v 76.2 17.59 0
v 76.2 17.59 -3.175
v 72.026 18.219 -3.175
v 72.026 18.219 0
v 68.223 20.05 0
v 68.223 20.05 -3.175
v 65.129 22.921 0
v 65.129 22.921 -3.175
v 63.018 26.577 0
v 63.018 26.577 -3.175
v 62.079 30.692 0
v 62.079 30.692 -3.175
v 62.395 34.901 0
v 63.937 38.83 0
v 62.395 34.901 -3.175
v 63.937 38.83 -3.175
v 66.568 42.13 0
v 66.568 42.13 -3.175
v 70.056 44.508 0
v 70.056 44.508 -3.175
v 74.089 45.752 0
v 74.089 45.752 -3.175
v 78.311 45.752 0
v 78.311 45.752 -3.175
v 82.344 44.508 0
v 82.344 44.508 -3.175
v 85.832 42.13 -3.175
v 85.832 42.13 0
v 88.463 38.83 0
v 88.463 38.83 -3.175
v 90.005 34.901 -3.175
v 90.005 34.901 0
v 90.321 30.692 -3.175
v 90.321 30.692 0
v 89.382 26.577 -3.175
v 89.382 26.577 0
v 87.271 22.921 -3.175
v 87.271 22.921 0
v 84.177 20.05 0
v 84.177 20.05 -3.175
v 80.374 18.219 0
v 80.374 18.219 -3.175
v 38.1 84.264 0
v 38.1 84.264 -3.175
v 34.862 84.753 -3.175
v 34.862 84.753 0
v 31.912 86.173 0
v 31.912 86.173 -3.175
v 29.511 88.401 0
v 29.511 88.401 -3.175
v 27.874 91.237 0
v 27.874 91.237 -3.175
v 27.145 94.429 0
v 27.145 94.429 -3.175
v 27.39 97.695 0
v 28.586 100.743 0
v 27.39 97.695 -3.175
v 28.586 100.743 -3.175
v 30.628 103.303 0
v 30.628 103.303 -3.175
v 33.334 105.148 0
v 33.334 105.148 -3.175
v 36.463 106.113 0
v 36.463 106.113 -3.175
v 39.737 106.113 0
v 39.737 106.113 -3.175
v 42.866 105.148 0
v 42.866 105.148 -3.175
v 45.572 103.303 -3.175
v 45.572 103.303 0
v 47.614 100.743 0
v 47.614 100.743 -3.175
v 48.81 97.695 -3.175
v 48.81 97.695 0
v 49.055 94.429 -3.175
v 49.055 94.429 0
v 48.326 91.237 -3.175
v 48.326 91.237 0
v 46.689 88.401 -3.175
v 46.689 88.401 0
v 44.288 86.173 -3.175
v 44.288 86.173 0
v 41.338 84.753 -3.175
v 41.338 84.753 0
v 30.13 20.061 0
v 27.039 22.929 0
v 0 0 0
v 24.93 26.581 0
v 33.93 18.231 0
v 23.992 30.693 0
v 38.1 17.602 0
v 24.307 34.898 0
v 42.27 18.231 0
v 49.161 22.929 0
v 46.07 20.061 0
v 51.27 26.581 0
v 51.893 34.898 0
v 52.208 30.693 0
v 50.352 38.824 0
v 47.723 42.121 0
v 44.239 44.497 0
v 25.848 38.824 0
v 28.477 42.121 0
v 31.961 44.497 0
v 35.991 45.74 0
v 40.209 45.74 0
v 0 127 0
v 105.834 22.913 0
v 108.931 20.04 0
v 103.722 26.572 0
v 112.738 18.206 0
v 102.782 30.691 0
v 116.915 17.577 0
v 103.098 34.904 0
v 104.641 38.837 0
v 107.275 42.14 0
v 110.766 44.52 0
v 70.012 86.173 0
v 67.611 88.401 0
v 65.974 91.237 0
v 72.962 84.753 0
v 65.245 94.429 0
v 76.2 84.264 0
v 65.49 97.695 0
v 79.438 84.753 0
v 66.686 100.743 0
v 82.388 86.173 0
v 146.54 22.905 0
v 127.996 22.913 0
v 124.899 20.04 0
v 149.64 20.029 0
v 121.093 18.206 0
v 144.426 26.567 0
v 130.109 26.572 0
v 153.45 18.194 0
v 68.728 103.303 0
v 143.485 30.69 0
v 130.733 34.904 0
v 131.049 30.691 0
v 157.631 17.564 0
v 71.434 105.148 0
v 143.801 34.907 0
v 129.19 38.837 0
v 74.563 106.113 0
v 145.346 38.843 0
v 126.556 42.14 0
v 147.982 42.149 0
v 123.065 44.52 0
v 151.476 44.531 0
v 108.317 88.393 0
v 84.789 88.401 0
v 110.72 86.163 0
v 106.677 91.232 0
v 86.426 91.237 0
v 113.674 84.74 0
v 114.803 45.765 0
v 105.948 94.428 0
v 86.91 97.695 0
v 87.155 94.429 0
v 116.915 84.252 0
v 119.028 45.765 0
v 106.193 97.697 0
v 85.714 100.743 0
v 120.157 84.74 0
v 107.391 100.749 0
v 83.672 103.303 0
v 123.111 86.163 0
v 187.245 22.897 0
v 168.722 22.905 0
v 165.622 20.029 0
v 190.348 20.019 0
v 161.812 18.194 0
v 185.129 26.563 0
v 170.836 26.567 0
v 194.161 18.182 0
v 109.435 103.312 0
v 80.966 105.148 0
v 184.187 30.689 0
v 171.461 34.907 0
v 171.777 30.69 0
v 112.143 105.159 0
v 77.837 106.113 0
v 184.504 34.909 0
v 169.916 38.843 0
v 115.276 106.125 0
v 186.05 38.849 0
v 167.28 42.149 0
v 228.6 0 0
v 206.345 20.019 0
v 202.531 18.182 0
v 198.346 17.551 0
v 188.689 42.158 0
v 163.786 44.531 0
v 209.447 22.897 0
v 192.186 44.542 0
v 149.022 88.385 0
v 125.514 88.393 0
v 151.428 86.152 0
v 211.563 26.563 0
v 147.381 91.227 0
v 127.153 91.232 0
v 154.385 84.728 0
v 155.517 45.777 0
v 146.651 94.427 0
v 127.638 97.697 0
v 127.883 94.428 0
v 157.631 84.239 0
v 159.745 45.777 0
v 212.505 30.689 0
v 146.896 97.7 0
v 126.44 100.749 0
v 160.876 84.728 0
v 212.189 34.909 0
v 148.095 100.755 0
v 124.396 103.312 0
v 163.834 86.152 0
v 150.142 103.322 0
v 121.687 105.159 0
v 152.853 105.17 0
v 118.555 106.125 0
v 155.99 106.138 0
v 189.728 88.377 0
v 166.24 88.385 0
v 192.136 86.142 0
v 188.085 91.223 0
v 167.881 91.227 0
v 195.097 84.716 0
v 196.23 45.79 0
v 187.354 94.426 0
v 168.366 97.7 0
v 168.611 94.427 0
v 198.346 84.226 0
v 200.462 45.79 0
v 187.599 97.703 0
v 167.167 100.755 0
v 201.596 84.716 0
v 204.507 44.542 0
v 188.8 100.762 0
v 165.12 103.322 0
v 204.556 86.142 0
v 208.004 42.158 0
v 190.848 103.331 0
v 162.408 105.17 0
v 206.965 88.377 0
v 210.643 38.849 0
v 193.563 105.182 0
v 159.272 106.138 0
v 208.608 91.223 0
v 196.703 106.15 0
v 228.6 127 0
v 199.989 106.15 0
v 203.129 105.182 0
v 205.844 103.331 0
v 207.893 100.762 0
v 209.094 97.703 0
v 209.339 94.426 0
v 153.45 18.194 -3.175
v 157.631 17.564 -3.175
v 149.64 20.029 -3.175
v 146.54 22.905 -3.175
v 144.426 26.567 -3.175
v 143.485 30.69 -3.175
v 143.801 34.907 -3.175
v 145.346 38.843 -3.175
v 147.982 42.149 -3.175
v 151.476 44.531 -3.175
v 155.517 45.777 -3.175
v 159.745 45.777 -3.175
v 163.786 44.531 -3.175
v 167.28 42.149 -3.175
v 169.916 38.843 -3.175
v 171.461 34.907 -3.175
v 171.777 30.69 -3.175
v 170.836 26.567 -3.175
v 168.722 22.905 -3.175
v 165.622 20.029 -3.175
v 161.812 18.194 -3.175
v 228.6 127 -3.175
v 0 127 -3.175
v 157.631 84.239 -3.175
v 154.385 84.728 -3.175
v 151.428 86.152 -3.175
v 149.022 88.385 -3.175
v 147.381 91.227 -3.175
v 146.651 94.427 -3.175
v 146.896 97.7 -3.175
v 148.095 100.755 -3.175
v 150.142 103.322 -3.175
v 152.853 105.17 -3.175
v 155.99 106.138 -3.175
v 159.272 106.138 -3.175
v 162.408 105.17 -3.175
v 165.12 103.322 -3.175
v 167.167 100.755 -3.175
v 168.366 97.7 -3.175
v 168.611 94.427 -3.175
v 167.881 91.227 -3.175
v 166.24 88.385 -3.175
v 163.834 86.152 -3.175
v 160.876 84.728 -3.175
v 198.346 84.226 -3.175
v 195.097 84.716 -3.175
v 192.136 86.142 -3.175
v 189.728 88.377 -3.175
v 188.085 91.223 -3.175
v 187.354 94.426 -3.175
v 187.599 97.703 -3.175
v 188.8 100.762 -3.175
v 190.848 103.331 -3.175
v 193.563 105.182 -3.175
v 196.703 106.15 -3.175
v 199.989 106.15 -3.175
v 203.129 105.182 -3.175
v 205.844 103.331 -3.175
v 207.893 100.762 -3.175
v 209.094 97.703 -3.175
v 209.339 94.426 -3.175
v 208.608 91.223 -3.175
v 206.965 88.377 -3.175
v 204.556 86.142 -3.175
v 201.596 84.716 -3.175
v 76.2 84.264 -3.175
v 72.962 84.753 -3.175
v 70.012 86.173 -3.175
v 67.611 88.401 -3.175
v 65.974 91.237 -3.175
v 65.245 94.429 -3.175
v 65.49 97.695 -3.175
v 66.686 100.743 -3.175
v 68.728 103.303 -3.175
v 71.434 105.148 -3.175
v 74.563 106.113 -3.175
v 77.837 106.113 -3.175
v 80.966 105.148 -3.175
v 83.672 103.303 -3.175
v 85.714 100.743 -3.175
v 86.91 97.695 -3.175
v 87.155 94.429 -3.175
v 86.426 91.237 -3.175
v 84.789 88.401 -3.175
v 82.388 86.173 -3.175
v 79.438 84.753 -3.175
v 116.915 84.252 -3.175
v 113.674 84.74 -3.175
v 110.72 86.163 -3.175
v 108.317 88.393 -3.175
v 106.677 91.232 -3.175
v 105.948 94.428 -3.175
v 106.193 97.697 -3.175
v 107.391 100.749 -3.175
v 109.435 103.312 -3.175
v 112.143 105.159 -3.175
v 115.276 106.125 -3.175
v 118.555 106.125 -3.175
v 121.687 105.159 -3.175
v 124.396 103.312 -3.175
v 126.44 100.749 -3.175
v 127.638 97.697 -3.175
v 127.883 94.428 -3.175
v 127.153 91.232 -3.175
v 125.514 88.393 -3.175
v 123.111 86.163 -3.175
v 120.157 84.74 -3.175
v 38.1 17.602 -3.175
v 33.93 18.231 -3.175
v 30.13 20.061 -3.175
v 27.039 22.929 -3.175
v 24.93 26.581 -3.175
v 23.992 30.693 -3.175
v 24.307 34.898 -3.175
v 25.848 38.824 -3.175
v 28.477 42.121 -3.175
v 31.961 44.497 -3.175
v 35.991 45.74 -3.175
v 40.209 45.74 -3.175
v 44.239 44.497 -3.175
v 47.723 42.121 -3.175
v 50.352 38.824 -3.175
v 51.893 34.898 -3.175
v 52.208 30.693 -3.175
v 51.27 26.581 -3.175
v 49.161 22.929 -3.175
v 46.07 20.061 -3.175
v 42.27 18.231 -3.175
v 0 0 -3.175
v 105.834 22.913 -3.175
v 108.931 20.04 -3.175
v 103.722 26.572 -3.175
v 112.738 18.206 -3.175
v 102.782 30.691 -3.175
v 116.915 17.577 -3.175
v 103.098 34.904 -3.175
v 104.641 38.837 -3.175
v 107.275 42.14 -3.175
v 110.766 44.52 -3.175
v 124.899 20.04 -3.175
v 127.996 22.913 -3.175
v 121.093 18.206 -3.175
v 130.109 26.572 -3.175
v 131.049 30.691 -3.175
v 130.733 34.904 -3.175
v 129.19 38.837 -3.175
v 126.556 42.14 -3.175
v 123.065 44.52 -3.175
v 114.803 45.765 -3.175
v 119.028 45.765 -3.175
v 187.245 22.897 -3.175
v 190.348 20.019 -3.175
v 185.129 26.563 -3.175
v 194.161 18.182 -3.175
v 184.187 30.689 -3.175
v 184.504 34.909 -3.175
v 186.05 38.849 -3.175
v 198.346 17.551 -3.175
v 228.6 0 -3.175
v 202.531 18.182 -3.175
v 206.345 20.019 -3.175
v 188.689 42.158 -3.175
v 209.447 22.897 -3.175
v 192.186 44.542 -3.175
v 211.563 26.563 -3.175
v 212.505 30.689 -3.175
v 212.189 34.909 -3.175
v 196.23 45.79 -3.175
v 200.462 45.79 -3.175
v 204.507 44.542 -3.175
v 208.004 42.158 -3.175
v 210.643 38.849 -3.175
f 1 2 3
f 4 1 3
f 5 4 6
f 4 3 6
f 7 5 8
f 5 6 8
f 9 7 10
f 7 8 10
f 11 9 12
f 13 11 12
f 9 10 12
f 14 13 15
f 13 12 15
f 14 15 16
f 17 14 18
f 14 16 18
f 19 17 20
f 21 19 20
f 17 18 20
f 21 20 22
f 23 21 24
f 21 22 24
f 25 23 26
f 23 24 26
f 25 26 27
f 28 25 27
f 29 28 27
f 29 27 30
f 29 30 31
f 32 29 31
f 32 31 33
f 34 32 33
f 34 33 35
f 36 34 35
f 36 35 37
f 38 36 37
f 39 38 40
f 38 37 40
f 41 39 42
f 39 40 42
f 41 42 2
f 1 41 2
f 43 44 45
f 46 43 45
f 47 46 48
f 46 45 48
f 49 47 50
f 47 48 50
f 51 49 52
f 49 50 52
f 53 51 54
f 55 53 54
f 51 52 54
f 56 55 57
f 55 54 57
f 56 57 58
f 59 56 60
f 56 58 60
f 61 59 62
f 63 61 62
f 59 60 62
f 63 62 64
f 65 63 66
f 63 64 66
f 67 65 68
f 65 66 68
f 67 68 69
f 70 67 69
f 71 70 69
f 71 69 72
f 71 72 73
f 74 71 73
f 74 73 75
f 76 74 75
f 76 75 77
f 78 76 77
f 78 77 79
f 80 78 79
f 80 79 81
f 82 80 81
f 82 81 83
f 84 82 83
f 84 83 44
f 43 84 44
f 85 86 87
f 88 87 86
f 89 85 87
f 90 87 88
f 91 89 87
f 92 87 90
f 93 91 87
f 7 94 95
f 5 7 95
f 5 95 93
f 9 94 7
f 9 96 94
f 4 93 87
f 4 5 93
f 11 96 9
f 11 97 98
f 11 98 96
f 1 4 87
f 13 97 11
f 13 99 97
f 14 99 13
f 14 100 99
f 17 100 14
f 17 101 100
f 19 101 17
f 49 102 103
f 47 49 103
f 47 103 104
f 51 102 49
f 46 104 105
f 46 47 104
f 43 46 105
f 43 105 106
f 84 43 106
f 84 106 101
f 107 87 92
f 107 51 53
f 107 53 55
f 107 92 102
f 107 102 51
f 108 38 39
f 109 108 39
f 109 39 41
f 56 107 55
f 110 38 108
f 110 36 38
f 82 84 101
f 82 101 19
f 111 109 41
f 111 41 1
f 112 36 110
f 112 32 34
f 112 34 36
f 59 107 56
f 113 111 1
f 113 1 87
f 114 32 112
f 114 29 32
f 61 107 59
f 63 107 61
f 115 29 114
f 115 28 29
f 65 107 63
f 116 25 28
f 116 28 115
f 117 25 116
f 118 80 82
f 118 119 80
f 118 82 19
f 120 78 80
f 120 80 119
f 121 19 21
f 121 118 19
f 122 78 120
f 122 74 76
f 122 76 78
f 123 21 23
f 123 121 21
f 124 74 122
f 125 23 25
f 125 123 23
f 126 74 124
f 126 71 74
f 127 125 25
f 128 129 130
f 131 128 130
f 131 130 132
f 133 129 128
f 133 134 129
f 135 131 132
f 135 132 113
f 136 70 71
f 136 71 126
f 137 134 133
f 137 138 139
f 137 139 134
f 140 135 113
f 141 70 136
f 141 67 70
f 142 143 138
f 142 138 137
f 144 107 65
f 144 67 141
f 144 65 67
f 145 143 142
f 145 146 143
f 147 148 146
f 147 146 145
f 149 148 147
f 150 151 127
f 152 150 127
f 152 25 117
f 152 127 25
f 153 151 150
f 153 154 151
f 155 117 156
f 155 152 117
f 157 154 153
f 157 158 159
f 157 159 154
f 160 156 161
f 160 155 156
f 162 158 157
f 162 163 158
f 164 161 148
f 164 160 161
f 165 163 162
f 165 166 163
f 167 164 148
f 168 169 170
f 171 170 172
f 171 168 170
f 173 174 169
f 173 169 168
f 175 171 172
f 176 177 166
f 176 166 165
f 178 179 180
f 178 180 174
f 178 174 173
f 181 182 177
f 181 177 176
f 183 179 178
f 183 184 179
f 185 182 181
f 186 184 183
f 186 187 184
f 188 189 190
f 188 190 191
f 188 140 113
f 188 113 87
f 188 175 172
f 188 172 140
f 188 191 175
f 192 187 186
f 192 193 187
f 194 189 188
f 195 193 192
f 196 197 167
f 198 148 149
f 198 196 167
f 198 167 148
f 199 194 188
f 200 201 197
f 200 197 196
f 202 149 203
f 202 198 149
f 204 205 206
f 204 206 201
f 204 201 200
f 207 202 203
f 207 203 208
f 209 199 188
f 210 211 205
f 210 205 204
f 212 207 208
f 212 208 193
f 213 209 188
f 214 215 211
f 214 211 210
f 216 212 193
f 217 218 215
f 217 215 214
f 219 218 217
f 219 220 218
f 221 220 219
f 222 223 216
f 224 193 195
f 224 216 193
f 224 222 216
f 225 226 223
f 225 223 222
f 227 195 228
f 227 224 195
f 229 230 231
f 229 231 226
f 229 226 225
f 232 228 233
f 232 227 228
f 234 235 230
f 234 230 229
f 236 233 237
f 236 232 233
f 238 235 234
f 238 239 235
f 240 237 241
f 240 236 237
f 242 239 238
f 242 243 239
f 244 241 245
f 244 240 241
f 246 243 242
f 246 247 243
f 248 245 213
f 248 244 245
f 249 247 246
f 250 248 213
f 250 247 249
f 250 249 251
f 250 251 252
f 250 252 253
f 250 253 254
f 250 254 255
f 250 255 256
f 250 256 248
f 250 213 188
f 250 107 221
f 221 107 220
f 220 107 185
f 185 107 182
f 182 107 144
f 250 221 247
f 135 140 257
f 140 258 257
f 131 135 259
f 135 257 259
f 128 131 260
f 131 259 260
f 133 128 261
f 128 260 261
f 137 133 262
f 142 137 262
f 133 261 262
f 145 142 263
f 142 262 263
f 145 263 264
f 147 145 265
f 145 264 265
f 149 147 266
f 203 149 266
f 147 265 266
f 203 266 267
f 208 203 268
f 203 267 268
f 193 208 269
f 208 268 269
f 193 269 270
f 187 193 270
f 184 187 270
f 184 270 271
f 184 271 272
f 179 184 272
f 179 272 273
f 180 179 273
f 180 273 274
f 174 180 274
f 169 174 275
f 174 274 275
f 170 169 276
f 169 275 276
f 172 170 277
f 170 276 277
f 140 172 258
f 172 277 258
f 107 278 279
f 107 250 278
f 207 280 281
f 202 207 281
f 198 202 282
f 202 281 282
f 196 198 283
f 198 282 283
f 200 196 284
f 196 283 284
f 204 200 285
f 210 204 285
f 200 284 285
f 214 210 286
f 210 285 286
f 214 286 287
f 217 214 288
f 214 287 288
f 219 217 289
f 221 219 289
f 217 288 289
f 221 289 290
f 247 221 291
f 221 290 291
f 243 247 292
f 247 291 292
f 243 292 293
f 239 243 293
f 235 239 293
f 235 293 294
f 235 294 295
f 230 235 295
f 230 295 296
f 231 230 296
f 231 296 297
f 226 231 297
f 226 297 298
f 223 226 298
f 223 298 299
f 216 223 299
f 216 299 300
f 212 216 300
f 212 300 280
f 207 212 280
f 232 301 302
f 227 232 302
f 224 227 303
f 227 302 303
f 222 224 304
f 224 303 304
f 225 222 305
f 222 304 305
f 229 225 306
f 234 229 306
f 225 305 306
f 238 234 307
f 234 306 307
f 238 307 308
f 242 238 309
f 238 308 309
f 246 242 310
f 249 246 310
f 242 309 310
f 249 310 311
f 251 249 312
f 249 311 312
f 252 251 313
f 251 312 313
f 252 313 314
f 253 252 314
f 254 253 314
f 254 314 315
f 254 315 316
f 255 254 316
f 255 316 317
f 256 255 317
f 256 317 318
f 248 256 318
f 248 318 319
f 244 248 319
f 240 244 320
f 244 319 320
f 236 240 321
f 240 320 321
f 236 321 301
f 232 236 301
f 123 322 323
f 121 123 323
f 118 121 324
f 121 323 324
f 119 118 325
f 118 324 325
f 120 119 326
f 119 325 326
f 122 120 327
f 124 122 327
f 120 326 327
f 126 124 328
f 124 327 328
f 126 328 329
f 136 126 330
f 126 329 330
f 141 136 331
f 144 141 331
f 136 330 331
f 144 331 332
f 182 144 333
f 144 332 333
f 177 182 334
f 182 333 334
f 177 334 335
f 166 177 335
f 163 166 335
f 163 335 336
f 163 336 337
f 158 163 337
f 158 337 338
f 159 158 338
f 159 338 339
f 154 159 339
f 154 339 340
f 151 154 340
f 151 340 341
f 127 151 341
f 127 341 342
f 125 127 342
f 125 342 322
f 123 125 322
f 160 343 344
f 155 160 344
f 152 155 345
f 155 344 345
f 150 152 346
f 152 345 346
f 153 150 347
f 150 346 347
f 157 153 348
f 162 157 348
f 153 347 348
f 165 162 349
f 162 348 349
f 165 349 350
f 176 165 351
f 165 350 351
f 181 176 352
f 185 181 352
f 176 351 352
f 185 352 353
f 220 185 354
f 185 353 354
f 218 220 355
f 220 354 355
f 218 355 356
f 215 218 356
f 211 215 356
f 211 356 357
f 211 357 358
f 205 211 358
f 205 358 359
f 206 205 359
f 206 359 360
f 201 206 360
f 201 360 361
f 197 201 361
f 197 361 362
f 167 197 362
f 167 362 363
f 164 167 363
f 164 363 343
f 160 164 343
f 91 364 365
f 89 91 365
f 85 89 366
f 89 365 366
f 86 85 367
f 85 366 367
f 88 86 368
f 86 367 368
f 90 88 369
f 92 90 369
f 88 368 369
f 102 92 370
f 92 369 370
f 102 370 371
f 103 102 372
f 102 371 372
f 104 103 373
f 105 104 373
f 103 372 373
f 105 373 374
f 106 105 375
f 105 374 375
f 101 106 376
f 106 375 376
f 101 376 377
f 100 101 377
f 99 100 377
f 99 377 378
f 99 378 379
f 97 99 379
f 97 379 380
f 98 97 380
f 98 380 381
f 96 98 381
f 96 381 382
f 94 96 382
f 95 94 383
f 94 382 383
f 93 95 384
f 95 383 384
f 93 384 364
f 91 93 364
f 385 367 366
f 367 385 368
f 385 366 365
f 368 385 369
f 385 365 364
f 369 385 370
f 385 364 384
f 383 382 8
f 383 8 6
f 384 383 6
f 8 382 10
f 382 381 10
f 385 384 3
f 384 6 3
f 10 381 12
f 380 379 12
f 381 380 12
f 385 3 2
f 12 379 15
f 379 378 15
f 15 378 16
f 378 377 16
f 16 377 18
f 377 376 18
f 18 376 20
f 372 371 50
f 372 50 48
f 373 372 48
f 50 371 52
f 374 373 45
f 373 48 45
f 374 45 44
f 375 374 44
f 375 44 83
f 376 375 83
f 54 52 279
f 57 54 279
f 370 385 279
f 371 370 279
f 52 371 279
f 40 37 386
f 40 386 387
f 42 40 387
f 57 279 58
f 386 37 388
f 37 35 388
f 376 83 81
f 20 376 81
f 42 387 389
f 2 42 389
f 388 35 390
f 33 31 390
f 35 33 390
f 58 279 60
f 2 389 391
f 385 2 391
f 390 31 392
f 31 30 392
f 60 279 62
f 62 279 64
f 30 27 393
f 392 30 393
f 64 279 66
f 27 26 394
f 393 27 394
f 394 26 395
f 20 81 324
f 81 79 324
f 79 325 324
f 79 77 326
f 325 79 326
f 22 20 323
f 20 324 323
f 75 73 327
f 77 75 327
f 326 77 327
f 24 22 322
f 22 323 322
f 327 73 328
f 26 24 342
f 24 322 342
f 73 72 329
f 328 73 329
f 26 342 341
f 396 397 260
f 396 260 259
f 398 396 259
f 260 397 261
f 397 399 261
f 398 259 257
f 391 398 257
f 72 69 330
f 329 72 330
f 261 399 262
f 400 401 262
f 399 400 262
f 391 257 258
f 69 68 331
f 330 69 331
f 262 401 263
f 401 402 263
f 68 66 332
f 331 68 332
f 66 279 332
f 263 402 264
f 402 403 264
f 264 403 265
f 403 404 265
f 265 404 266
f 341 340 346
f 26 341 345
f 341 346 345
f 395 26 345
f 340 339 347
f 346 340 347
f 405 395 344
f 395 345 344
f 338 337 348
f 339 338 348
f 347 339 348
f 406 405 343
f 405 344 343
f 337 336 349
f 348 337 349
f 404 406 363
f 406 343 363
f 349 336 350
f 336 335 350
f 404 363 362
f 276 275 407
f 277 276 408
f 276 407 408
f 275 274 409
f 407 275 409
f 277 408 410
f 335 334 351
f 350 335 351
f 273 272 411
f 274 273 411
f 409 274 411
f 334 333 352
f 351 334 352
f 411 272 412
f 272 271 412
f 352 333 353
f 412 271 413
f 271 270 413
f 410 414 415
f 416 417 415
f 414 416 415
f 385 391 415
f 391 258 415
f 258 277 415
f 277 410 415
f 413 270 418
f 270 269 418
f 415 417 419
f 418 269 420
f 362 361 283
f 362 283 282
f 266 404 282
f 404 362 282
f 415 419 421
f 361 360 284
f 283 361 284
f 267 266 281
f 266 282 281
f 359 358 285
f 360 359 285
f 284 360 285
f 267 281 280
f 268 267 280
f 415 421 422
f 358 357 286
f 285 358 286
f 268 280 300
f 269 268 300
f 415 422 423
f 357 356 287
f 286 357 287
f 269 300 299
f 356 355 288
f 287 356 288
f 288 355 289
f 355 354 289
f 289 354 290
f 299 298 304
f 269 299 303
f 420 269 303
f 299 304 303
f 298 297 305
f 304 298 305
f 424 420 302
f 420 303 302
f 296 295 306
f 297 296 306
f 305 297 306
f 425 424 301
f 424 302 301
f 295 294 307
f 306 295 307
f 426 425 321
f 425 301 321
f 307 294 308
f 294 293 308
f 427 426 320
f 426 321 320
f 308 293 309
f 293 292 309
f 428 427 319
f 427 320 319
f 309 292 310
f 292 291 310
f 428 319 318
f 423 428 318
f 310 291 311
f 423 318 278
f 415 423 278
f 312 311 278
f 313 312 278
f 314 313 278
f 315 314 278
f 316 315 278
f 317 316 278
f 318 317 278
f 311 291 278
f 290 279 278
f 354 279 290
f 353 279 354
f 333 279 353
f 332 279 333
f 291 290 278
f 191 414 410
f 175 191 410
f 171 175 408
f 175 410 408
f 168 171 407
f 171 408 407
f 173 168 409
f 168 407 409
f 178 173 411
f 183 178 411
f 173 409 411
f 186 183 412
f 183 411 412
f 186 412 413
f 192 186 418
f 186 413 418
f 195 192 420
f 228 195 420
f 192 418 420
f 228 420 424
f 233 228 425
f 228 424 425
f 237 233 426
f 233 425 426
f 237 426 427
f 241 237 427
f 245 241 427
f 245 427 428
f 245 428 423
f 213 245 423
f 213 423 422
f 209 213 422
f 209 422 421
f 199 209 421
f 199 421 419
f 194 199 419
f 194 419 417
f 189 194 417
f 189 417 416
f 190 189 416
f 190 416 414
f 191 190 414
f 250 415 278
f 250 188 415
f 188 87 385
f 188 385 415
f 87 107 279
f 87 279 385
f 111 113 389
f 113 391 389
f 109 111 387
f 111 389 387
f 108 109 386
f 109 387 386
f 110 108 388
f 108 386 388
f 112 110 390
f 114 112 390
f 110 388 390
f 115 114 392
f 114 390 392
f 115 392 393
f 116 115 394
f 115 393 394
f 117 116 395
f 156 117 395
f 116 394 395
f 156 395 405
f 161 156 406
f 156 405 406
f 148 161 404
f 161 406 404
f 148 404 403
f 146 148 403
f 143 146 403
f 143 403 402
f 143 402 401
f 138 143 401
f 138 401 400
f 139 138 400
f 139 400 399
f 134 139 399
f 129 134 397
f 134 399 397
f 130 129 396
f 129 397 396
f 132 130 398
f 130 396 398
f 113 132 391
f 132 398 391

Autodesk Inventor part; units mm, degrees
ref_plane "YZ Plane" through (0, 0, 0) normal (1, 0, 0) x (0, 1, 0)
ref_plane "XZ Plane" through (0, 0, 0) normal (0, 1, 0) x (-1, 0, 0)
ref_plane "XY Plane" through (0, 0, 0) normal (0, 0, 1) x (1, 0, 0)
sketch "Sketch1" plane through (0, 0, 0) normal (0, 0, 1) x (1, 0, 0)
  line L0 (0, 0) -> (228.6, 0)
  line L1 (228.6, 0) -> (228.6, 127)
  line L2 (228.6, 127) -> (0, 127)
  line L3 (0, 127) -> (0, 0)
  dimension "d0" = 228.6
  dimension "d1" = 127
extrude "Extrusion1" add sketch "Sketch1" against normal blind 3.175
sketch "Sketch2" plane through (0, 0, 0) normal (0, 0, 1) x (1, 0, 0)
  line L0 (0, 0) -> (228.6, 0) projected
  line L1 (0, 127) -> (0, 0) projected
  point P0 (38.1, 31.75)
  point P1 (76.2, 31.75)
  point P2 (116.9154, 31.75)
  point P3 (157.6309, 31.75)
  point P4 (198.3463, 31.75)
  point P5 (0, 63.5)
  dimension "d4" = 31.75
  dimension "d5" = 38.1
  dimension "d6" = 38.1
  dimension "d7" = 40.7154
  dimension "d8" = 40.7154
  dimension "d9" = 40.7154
hole "Hole1" at (38.1, 31.75, 0) direction (0, 0, -1) diameter 28.2956 end through all
hole "Hole2" at (76.2, 31.75, 0) direction (0, 0, -1) diameter 28.321 end through all
hole "Hole3" at (116.9154, 31.75, 0) direction (0, 0, -1) diameter 28.3464 end through all
hole "Hole4" at (157.6309, 31.75, 0) direction (0, 0, -1) diameter 28.3718 end through all
hole "Hole5" at (198.3463, 31.75, 0) direction (0, 0, -1) diameter 28.3972 end through all
sketch "Sketch3" plane through (0, 0, 0) normal (0, 0, 1) x (1, 0, 0)
  line L0 (0, 0) -> (0, 127) construction
  line L1 (0, 63.5) -> (228.6, 63.5) construction
  line L2 (228.6, 127) -> (228.6, 0) construction
  point P0 (38.1, 31.75)
  point P1 (76.2, 31.75)
  point P2 (116.9154, 31.75)
  point P3 (157.6309, 31.75)
  point P4 (198.3463, 31.75)
  point P5 (38.1, 95.25)
  point P6 (76.2, 95.25)
  point P7 (116.9154, 95.25)
  point P8 (157.6309, 95.25)
  point P9 (198.3463, 95.25)
hole "Hole6" at (38.1, 95.25, 0) direction (0, 0, -1) diameter 21.971 end through all
hole "Hole7" at (76.2, 95.25, 0) direction (0, 0, -1) diameter 21.971 end through all
hole "Hole8" at (116.9154, 95.25, 0) direction (0, 0, -1) diameter 21.9964 end through all
hole "Hole9" at (157.6309, 95.25, 0) direction (0, 0, -1) diameter 22.0218 end through all
hole "Hole10" at (198.3463, 95.25, 0) direction (0, 0, -1) diameter 22.0472 end through all
equation "\"d6\" = d5"
equation "\"d8\" = d7"
equation "\"d9\" = d7"
properties part number "BEARING TEST" material "Aluminum 6061"
